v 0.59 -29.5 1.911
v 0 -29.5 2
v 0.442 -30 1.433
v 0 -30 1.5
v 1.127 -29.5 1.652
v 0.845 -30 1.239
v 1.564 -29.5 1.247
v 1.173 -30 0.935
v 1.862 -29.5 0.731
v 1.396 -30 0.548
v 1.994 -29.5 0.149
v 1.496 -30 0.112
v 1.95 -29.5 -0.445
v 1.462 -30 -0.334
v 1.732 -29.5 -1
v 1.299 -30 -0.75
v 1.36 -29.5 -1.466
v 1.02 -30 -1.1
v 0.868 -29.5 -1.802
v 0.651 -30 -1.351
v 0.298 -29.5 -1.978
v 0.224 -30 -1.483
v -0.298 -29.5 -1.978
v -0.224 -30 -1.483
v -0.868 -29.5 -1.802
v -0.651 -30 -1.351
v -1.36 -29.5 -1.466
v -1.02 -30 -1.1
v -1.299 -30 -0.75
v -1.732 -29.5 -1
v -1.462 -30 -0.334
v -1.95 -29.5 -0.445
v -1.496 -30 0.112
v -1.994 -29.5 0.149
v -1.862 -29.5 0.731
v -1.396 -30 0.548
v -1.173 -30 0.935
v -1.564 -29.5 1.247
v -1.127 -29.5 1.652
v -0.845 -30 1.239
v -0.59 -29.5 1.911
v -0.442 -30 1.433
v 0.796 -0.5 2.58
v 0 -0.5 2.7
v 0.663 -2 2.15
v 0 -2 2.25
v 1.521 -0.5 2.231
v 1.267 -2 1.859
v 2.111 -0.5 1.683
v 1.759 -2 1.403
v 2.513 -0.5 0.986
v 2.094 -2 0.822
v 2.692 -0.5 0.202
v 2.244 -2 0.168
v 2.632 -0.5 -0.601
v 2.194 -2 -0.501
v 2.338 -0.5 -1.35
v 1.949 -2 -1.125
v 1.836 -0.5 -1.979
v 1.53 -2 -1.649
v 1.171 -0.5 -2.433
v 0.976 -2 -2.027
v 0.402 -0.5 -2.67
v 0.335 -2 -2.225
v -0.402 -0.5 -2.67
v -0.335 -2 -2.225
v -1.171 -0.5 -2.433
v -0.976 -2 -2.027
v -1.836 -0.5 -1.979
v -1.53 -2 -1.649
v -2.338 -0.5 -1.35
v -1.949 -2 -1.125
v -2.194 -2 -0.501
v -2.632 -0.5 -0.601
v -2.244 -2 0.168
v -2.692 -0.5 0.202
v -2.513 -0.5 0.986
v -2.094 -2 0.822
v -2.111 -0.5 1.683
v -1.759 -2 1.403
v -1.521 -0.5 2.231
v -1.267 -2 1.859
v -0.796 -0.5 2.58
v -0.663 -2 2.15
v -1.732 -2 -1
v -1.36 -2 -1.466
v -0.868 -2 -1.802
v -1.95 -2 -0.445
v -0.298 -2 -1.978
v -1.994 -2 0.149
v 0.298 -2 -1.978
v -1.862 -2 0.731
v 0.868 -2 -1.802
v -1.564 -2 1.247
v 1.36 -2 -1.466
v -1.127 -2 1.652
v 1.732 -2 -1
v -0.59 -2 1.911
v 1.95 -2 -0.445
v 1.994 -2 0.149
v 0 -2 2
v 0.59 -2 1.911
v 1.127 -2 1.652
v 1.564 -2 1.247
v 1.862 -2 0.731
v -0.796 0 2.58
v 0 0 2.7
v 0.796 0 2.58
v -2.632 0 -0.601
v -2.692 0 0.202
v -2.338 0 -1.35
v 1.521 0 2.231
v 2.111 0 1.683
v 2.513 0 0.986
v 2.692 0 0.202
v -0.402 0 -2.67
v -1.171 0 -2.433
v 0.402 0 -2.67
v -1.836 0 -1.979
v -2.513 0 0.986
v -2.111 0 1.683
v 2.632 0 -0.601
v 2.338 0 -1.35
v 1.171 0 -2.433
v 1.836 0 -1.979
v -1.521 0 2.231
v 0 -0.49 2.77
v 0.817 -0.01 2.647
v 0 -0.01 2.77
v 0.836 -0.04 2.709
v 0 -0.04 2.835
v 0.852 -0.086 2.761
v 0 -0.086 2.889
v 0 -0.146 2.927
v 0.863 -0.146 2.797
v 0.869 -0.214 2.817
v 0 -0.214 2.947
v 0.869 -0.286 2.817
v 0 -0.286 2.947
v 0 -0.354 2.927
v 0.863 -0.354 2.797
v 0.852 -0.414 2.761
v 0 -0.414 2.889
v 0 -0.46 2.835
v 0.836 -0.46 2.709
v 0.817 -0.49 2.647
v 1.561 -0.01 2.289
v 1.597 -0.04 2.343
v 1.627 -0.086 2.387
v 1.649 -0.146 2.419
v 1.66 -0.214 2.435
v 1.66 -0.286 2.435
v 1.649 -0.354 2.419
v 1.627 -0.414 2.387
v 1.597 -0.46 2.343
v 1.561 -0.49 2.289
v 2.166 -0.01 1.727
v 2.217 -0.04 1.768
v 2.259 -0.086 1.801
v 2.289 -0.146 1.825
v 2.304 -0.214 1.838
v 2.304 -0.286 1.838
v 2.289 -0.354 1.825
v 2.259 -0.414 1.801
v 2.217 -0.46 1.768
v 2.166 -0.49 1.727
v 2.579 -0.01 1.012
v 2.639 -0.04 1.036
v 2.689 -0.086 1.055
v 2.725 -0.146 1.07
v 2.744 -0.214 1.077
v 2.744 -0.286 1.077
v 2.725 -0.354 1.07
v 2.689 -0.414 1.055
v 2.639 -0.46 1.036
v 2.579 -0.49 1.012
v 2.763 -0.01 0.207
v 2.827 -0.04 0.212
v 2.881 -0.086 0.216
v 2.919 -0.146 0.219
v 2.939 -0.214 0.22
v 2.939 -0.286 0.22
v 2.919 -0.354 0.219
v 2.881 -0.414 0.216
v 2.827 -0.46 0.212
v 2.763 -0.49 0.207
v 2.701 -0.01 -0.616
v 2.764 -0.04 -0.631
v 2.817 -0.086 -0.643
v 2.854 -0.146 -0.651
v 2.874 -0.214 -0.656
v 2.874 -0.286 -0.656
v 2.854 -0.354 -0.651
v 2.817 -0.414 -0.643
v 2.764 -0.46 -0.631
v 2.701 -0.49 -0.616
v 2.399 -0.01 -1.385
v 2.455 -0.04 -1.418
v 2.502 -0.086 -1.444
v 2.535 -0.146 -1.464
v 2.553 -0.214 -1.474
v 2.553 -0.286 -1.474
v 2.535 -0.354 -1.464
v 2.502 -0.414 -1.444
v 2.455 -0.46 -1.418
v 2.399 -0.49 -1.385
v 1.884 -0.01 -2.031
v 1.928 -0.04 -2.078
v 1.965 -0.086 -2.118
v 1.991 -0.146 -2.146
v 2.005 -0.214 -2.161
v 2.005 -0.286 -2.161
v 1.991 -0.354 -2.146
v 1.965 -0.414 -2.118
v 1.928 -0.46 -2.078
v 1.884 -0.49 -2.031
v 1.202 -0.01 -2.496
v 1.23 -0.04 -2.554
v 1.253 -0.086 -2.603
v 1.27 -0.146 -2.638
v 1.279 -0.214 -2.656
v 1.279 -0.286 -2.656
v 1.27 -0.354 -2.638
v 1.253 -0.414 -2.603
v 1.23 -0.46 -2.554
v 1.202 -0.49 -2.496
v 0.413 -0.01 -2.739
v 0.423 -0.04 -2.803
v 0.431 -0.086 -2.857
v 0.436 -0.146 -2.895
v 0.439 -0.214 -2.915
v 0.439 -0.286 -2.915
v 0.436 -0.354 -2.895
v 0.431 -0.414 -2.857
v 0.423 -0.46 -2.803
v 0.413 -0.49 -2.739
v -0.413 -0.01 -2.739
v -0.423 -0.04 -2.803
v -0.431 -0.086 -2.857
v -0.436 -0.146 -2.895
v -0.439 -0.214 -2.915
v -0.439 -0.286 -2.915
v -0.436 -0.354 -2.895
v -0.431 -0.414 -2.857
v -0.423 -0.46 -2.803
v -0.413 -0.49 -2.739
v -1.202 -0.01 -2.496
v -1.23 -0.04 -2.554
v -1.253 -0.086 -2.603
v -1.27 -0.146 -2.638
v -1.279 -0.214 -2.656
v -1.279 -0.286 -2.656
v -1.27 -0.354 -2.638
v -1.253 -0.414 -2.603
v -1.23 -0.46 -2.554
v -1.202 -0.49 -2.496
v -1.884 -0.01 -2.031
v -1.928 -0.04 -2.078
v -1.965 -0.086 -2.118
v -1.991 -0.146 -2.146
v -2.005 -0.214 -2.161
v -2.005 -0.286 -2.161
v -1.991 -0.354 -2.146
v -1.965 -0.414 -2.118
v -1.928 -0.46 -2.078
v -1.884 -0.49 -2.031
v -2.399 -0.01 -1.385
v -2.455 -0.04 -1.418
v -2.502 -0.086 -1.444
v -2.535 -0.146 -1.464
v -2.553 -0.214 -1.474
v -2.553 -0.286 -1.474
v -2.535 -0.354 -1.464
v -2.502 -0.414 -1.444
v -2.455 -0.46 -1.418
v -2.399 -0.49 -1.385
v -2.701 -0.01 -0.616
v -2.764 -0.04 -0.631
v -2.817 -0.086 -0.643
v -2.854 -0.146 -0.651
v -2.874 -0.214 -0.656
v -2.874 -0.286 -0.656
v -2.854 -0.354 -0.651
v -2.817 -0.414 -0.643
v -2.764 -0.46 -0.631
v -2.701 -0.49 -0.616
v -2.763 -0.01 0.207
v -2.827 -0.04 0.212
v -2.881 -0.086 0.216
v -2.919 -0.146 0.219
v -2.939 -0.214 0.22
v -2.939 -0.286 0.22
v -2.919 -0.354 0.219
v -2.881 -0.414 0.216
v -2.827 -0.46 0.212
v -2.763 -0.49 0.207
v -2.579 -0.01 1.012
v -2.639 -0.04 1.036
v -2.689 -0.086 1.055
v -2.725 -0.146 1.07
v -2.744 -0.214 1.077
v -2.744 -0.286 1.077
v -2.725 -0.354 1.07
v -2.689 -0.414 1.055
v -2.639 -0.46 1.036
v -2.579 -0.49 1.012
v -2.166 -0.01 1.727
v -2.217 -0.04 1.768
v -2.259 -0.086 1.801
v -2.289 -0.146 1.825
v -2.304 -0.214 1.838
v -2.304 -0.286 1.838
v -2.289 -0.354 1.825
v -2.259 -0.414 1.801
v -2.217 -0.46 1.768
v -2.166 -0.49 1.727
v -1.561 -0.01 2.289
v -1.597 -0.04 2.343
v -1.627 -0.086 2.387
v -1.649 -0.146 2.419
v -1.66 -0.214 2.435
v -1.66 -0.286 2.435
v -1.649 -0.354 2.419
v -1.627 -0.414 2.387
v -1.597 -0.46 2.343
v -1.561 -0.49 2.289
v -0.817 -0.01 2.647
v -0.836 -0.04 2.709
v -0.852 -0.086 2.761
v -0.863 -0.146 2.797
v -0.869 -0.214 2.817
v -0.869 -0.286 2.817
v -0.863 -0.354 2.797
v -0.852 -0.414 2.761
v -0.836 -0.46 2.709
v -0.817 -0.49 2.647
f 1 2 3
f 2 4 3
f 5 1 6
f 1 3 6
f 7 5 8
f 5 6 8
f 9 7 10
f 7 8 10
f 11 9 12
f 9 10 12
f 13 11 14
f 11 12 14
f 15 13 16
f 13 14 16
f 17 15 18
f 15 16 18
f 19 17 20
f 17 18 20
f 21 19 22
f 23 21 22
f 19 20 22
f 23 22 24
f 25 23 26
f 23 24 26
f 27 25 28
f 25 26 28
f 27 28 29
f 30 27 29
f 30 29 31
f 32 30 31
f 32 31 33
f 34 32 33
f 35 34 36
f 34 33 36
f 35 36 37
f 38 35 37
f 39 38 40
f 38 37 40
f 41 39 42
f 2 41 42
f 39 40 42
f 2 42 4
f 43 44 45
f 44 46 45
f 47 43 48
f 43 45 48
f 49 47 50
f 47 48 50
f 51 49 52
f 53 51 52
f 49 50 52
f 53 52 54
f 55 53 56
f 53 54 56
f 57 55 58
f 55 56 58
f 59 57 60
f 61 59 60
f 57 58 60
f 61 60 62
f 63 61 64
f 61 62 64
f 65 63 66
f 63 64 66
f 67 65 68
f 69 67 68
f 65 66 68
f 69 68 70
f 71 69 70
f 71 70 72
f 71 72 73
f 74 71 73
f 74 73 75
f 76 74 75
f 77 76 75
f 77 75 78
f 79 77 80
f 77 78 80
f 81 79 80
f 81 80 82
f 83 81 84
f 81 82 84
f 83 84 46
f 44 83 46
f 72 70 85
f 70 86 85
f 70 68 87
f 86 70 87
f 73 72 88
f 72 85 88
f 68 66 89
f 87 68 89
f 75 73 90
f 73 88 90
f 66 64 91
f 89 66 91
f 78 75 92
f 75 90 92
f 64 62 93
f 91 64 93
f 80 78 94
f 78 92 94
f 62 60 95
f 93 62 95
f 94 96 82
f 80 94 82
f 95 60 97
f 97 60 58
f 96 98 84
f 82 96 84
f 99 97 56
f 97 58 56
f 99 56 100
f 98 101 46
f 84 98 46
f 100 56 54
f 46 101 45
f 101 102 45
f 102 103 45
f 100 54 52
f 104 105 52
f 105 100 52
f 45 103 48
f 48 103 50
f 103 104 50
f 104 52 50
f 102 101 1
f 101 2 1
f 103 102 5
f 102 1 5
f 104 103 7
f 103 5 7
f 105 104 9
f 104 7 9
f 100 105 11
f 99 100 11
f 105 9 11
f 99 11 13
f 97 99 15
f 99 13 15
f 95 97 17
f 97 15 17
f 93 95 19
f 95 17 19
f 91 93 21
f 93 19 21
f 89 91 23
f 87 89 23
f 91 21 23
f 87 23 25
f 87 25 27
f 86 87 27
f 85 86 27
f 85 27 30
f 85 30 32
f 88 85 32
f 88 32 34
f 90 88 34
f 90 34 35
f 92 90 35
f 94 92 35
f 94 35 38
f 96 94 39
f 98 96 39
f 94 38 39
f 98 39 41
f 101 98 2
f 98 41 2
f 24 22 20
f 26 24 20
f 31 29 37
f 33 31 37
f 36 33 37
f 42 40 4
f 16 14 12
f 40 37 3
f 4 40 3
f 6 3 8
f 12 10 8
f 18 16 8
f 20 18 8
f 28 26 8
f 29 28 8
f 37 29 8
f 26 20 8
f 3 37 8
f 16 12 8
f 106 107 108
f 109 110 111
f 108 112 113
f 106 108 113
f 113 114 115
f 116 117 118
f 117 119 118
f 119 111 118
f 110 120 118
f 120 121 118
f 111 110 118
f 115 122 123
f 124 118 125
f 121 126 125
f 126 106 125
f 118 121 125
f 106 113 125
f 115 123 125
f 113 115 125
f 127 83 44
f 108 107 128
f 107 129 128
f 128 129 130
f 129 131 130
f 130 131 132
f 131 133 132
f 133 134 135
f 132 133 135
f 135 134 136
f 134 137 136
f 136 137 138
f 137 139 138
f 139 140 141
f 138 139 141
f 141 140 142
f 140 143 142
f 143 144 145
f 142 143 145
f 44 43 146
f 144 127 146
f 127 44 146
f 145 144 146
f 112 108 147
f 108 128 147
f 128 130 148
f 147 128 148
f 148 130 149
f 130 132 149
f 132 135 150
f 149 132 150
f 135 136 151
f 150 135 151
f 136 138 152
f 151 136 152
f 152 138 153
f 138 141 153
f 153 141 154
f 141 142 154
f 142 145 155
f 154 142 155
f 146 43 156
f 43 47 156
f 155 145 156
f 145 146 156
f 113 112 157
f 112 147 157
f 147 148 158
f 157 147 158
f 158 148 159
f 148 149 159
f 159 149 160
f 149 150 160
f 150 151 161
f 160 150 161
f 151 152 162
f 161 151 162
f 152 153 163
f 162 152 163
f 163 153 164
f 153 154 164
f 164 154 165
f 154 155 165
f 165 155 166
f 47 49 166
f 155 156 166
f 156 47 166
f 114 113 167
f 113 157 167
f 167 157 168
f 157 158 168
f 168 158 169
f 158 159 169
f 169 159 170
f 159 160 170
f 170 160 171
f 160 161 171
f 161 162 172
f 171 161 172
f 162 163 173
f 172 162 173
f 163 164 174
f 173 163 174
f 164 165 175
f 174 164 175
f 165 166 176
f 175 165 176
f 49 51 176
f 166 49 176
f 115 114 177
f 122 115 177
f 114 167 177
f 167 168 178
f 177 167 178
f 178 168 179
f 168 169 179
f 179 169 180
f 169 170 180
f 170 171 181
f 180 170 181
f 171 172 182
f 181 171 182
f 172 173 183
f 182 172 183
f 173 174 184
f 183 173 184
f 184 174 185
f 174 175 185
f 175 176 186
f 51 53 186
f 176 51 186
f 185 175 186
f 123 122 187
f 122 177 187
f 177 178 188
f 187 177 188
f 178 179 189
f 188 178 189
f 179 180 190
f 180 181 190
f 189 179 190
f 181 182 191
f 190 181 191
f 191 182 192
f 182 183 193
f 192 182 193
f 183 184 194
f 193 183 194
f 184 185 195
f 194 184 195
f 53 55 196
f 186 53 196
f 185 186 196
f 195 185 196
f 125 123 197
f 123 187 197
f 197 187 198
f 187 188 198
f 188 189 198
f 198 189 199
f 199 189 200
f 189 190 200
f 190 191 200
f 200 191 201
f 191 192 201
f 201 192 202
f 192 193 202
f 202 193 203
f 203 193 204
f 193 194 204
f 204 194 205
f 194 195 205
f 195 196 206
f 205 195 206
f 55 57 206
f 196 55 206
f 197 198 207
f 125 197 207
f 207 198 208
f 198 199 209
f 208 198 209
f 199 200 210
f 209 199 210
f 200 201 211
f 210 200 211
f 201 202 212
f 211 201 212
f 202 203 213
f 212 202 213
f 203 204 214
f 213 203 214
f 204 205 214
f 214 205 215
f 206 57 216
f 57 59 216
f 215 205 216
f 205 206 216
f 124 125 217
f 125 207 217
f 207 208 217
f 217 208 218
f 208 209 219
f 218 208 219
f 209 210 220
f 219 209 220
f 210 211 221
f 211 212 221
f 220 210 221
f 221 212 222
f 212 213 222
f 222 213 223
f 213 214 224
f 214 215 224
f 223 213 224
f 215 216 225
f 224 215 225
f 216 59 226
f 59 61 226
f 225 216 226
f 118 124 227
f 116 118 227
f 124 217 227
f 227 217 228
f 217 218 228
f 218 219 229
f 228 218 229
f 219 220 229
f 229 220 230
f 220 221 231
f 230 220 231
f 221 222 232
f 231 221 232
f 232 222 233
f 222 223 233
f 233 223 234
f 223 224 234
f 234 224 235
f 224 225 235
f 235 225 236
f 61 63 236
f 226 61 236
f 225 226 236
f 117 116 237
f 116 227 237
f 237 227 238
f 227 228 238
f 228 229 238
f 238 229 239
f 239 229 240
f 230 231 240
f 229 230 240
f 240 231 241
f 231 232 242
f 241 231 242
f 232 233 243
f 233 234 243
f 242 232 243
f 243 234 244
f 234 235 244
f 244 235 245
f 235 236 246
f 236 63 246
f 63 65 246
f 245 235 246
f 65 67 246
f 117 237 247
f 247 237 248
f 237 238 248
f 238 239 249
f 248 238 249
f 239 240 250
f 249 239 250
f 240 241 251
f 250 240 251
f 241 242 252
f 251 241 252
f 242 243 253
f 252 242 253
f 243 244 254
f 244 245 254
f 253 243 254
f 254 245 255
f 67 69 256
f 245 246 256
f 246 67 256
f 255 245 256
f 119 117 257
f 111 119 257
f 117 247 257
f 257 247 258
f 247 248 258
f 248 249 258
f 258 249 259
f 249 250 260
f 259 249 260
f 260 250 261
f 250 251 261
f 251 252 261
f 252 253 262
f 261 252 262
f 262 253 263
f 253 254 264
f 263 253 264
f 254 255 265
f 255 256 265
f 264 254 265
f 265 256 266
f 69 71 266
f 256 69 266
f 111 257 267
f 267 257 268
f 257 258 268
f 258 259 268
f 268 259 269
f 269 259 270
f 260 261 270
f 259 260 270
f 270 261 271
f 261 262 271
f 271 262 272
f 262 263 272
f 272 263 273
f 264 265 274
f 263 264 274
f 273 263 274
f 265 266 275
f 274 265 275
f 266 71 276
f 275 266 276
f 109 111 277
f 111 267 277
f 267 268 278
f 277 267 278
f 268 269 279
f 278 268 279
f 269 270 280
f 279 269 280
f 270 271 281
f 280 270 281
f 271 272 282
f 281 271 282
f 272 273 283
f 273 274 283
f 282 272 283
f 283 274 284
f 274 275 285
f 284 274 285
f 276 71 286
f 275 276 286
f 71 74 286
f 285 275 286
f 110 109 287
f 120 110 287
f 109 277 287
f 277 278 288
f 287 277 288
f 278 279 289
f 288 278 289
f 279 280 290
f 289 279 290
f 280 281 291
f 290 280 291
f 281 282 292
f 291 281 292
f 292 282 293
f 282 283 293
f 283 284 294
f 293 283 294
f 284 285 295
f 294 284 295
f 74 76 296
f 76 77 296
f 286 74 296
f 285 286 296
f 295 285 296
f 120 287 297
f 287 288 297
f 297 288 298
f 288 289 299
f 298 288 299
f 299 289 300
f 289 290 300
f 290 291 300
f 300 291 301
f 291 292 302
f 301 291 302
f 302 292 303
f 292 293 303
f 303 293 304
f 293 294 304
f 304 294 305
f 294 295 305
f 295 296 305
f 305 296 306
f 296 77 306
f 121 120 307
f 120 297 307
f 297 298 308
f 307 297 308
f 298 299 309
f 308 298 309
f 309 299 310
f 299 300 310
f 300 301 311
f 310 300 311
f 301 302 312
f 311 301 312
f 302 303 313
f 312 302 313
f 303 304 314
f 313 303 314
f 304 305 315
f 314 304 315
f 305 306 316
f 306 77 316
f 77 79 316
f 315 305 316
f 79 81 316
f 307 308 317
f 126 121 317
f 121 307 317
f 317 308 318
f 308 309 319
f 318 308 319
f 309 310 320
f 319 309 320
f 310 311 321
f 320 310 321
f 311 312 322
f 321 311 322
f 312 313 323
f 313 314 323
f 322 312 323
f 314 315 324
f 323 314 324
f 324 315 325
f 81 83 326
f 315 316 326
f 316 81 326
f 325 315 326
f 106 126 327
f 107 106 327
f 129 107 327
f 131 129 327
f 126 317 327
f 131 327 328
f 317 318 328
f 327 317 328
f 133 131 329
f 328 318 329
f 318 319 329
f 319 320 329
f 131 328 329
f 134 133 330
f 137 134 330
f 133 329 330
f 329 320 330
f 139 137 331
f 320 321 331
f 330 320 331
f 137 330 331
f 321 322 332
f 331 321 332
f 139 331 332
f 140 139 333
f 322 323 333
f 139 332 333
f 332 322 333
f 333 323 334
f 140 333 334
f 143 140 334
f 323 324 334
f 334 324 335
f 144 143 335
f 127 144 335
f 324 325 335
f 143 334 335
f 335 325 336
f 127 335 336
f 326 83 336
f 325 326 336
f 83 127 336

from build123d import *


with BuildPart() as part:
    # Sketch1 → Revolve1 (revolve)
    with BuildSketch(Plane(origin=(0, 0, 0), x_dir=(-1, 0, 0), z_dir=(0, 0, -1)), mode=Mode.PRIVATE) as revolve1_sk:
        with BuildLine():
            Line((-1.5, -30), (0, -30))
            Line((0, -30), (0, 0))
            Line((0, 0), (-2.7, 0))
            ThreePointArc((-2.7, 0), (-2.95, -0.25), (-2.7, -0.5))
            Line((-2.7, -0.5), (-2.25, -2))
            Line((-2.25, -2), (-2, -2))
            Line((-2, -2), (-2, -29.5))
            Line((-2, -29.5), (-1.5, -30))
        make_face()
    revolve(revolve1_sk.sketch.rotate(Axis((0, -30, 0), (0, 1, 0)), 270), axis=Axis((0, -30, 0), (0, 1, 0)))


solid = part.part
